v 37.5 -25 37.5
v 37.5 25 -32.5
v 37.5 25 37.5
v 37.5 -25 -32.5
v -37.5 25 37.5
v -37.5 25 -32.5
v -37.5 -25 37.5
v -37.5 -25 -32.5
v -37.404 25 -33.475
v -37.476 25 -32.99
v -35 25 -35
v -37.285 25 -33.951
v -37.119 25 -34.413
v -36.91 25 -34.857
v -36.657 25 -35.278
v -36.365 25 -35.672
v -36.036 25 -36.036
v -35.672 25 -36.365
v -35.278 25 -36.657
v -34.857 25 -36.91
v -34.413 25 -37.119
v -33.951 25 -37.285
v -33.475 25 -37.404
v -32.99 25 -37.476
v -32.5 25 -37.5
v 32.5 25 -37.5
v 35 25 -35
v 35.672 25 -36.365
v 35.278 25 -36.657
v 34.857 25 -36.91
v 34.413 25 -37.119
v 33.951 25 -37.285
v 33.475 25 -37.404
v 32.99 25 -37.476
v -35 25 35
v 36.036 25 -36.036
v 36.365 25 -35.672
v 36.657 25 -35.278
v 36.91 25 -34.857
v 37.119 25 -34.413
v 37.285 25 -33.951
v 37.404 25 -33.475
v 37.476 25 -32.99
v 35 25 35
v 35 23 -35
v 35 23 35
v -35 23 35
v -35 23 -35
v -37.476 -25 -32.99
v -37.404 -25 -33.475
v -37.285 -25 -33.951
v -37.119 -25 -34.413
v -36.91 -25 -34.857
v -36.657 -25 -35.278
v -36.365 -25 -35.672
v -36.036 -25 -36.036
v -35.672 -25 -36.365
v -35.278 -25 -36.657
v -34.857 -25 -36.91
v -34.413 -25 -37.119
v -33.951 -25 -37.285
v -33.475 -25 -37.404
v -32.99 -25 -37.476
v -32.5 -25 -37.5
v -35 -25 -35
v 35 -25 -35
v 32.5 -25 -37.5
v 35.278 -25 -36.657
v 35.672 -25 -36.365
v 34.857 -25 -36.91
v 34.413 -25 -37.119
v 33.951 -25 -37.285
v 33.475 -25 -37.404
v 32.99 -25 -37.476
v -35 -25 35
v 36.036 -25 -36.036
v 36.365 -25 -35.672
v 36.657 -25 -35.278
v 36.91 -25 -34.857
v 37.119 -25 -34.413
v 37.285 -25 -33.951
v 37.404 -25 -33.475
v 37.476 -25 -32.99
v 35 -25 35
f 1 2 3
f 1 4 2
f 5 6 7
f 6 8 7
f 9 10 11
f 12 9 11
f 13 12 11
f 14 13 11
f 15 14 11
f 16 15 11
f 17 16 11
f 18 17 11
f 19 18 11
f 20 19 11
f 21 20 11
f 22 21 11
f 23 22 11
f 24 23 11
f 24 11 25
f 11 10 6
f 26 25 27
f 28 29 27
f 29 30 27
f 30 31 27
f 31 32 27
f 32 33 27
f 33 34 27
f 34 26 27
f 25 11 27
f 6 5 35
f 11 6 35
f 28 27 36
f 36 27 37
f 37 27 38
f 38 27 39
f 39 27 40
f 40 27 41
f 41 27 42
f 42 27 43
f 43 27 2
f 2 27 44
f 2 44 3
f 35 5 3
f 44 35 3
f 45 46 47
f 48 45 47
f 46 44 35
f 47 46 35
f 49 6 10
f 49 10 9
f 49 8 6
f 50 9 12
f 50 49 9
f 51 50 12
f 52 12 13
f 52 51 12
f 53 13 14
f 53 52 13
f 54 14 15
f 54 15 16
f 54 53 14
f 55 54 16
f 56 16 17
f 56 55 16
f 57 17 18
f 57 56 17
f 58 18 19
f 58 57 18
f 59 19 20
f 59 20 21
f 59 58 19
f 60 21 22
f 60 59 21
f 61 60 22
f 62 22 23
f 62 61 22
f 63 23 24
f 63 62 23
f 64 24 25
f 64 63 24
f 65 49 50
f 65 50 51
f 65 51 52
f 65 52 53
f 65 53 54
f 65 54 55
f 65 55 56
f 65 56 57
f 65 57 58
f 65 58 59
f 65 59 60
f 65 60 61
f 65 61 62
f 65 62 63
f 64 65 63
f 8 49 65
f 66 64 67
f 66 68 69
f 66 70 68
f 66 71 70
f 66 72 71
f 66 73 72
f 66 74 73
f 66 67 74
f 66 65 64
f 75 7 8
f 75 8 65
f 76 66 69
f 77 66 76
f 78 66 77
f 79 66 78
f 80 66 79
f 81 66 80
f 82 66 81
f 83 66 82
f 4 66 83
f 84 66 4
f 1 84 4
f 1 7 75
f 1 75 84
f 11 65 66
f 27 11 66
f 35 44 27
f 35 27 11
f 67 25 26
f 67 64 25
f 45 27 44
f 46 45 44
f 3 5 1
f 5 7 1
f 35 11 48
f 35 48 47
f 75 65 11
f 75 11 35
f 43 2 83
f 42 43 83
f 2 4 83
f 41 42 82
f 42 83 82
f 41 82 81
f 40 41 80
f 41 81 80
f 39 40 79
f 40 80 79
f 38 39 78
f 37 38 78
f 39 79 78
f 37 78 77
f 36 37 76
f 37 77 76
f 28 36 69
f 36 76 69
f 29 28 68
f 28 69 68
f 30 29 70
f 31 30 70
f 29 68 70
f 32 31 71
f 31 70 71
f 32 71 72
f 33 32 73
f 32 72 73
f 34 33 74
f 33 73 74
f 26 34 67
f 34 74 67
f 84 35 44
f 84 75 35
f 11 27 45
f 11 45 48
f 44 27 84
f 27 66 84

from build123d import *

# Parameters (mm, degrees)
F0_W     = 75
F0_H     = 75
F0_W_2   = 70
F0_H_2   = 70
F1_DEPTH = 25
F2_R     = 5
F3_W     = 70
F3_H     = 70
F4_DEPTH = 2


with BuildPart() as f1:
    # F0 (on Front) → F1 (new body, symmetric)
    with BuildSketch(Plane.XZ):
        Rectangle(F0_W, F0_H)
        Rectangle(F0_W_2, F0_H_2, mode=Mode.SUBTRACT)
    extrude(amount=F1_DEPTH, both=True)

    # F2
    f2_edges = [f1.edges().sort_by_distance(p)[0] for p in [
        (-37.5, 0, -37.5),
        (37.5, 0, -37.5),
    ]]
    fillet(f2_edges, radius=F2_R)


with BuildPart() as f4:
    # F3 (on face) → F4 (new body)
    with BuildSketch(Plane(origin=(0, 25, 0), x_dir=(-1, 0, 0), z_dir=(0, 1, 0))):
        Rectangle(F3_W, F3_H)
    extrude(amount=-F4_DEPTH)


solid = Compound([f1.part, f4.part])
